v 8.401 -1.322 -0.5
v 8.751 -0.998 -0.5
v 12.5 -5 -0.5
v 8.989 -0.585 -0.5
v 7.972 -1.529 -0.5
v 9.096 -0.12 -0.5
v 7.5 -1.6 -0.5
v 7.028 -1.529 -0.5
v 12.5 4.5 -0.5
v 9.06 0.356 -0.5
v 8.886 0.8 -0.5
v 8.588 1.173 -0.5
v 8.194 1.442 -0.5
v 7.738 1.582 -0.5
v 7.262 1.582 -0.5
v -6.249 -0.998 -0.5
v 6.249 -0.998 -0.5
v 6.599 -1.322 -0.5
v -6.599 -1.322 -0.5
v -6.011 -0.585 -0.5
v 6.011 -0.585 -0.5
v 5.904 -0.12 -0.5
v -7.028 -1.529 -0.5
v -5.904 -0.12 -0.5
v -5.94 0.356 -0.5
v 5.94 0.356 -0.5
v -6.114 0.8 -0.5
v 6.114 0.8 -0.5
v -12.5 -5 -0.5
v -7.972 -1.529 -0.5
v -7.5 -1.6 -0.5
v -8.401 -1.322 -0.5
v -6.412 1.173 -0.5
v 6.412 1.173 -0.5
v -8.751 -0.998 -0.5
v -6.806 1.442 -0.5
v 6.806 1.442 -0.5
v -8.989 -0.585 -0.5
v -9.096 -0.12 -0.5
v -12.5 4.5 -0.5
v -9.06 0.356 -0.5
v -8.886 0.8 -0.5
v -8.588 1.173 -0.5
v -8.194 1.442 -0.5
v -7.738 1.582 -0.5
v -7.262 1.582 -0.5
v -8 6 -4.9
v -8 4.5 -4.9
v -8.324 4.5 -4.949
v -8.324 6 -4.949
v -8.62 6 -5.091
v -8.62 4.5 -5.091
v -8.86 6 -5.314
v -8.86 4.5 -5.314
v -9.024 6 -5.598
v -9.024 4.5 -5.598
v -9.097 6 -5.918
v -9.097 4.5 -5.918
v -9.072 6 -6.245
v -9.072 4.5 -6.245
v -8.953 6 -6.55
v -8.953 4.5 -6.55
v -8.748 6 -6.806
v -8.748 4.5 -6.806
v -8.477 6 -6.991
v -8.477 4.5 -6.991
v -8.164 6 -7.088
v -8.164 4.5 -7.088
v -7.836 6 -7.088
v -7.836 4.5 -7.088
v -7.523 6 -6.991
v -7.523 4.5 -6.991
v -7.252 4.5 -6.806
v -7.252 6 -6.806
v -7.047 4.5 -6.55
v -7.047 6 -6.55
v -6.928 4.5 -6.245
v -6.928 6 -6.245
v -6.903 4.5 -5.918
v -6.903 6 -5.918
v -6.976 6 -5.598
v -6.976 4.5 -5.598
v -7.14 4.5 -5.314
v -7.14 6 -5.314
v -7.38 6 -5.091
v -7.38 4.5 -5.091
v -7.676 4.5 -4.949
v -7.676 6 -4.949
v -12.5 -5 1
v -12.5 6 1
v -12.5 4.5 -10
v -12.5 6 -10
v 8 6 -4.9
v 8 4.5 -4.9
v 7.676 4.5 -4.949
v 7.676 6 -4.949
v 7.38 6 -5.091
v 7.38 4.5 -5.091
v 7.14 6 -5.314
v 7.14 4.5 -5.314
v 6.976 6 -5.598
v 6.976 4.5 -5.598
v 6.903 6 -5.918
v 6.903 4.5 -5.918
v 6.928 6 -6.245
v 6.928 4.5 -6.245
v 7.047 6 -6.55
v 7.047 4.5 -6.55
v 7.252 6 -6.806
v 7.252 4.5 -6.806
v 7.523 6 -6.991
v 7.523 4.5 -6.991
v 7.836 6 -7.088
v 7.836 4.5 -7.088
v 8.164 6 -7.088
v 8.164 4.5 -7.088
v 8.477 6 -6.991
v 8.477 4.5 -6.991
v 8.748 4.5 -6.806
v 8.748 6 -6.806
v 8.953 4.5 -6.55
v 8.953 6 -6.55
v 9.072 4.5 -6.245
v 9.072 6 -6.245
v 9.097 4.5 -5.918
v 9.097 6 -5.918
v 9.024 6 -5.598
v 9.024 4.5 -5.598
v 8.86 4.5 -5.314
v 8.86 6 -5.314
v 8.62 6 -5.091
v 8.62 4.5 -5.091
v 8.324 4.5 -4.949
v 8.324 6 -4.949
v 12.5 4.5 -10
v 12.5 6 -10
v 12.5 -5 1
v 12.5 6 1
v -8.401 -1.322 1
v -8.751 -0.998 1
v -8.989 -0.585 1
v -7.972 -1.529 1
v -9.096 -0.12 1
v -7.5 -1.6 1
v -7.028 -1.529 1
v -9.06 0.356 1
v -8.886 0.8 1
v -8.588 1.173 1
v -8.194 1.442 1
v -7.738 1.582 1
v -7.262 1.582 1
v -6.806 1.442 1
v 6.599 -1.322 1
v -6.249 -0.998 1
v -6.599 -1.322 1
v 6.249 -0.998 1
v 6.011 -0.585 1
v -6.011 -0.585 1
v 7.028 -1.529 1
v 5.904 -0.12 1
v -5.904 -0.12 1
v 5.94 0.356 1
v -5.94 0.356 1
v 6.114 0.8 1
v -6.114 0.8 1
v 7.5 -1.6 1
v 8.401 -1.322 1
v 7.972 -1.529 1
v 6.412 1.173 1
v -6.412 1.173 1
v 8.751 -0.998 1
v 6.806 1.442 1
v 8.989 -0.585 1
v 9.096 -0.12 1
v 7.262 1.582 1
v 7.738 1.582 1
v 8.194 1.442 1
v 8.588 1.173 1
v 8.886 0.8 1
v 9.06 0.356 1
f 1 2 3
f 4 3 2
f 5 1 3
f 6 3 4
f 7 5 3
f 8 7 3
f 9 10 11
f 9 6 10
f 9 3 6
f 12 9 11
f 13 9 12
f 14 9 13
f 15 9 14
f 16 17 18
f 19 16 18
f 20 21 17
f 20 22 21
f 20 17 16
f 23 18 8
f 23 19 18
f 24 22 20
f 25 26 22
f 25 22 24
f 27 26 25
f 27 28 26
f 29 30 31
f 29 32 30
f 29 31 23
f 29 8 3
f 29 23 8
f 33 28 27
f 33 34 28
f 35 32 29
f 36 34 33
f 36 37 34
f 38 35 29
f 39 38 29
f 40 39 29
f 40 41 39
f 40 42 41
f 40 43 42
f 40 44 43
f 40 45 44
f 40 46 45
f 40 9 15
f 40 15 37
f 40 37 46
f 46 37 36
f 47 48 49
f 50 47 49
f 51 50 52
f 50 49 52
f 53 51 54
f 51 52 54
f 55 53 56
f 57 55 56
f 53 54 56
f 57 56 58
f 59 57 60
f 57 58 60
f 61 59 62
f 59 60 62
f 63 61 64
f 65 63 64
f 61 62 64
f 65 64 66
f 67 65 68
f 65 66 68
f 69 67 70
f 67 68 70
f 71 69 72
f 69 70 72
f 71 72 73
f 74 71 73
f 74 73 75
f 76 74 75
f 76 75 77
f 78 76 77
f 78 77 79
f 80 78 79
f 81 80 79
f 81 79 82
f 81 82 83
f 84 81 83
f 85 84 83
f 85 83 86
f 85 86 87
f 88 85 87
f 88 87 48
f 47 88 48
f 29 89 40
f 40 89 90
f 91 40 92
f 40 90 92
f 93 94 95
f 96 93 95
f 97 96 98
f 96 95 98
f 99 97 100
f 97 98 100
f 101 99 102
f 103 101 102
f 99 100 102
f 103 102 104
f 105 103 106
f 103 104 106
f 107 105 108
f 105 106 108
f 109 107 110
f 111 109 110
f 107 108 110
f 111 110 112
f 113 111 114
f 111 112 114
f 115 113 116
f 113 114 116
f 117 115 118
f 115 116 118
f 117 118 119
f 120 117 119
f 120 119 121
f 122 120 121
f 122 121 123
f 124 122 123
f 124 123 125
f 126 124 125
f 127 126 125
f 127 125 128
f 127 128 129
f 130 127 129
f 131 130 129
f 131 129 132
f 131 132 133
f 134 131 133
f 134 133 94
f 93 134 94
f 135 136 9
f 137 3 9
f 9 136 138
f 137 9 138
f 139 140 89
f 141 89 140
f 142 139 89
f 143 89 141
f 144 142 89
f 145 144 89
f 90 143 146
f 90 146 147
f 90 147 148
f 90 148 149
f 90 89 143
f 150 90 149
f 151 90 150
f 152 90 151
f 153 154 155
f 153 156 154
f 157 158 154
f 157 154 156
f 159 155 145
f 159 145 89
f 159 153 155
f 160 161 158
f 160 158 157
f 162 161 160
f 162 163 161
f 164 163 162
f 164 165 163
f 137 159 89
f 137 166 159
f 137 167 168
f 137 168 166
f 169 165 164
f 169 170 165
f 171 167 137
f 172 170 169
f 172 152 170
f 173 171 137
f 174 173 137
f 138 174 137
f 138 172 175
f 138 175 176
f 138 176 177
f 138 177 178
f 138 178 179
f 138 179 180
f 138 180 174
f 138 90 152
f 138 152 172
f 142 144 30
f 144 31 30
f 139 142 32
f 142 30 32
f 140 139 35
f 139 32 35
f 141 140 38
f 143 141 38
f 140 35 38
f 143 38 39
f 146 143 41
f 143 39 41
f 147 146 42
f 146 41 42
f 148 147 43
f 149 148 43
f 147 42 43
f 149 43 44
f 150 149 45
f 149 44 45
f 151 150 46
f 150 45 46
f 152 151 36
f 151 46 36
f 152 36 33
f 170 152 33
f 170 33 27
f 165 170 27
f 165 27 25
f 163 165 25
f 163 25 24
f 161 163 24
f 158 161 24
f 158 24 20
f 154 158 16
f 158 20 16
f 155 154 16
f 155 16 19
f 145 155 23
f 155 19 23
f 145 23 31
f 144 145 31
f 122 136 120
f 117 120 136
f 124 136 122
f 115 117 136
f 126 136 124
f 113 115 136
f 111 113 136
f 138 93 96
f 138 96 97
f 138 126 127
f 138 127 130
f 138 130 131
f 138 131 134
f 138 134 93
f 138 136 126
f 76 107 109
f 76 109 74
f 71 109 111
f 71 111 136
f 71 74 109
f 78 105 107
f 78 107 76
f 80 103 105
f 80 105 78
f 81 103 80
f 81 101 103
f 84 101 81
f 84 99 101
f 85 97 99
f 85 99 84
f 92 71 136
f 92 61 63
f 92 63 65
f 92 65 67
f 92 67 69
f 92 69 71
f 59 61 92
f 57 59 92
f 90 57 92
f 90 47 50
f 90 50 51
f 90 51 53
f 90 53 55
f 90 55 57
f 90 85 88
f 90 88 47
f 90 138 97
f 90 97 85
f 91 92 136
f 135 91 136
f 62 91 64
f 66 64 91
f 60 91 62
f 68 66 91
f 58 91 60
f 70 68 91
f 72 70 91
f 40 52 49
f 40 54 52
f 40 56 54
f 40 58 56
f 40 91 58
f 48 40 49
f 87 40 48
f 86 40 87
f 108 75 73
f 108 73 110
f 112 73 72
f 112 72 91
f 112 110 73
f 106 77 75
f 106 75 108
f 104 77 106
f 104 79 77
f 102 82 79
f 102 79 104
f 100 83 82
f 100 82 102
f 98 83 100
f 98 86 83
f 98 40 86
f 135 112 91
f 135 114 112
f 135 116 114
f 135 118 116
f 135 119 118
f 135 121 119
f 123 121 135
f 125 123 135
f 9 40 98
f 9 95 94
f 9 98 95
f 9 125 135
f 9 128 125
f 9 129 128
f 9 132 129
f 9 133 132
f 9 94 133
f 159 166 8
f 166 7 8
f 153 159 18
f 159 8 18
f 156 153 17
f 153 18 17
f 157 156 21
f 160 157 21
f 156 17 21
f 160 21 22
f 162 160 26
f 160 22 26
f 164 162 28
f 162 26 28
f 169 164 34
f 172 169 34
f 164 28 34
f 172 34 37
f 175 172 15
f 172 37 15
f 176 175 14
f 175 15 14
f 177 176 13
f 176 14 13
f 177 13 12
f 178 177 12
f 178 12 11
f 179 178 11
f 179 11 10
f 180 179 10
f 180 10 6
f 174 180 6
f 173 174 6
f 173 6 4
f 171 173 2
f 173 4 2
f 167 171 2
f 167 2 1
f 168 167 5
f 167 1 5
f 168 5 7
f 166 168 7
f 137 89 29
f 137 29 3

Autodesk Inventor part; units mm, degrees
ref_plane "YZ Plane" through (0, 0, 0) normal (1, 0, 0) x (0, 1, 0)
ref_plane "XZ Plane" through (0, 0, 0) normal (0, 1, 0) x (-1, 0, 0)
ref_plane "XY Plane" through (0, 0, 0) normal (0, 0, 1) x (1, 0, 0)
sketch "スケッチ1" plane through (0, 0, 0) normal (0, 0, 1) x (1, 0, 0)
  line L0 (-12.5, 5) -> (12.5, 5)
  line L1 (12.5, 5) -> (12.5, -5)
  line L2 (12.5, -5) -> (-12.5, -5)
  line L3 (-12.5, -5) -> (-12.5, 5)
  line L4 (-12.5, 5) -> (12.5, -5) construction
  line L5 (12.5, 5) -> (-12.5, -5) construction
  point P0 (0, 0)
  dimension "d0" = 25
  dimension "d1" = 10
extrude "押し出し1" add sketch "スケッチ1" along normal blind 1
sketch "スケッチ3" plane through (0, 0, 1) normal (0, 0, 1) x (1, 0, 0)
  line L0 (-12.5, 5) -> (12.5, 5)
  line L1 (12.5, 5) -> (12.5, 6)
  line L2 (12.5, 6) -> (-12.5, 6)
  line L3 (-12.5, 6) -> (-12.5, 5)
  point P0 (0, 0)
  dimension "d15" = 25
  dimension "d16" = 1
extrude "押し出し2" add sketch "スケッチ3" against normal blind 11
sketch "スケッチ7" plane through (0, 0, 0) normal (0, 0, -1) x (-1, 0, 0)
  line L0 (12.5, -5) -> (-12.5, -5)
  line L1 (-12.5, -5) -> (-12.5, 5)
  line L2 (-12.5, 5) -> (12.5, 5)
  line L3 (12.5, 5) -> (12.5, -5)
  point P0 (0, 0)
extrude "押し出し4" add sketch "スケッチ7" along normal blind 0.5
sketch "スケッチ8" plane through (-12.5, 5, -10) normal (0, -1, 0) x (1, 0, 0)
  line L0 (0, 0) -> (25, 0)
  line L1 (25, 0) -> (25, 9.5)
  line L2 (25, 9.5) -> (0, 9.5)
  line L3 (0, 9.5) -> (0, 0)
  point P0 (12.5, 10)
extrude "押し出し5" add sketch "スケッチ8" along normal blind 0.5
sketch "スケッチ9" plane through (0, 0, 1) normal (0, 0, 1) x (1, 0, 0)
  line L0 (-12.5, 4.5) -> (12.5, 4.5) projected
  line L1 (12.5, -5) -> (12.5, 6) projected
  line L2 (-12.5, 6) -> (-12.5, -5) projected
  point P0 (0, 0)
  point P1 (7.5, 0)
  point P2 (-7.5, 0)
  dimension "d38" = 4.5
  dimension "d39" = 5
  dimension "d40" = 5
  dimension "d41" = 4.5
hole "穴3" at (7.5, 0, 1) at (-7.5, 0, 1) direction (0, 0, -1) diameter 3.2 depth 8 tip angle 118
sketch "スケッチ10" plane through (-12.5, 6, 1) normal (0, 1, 0) x (1, 0, 0)
  line L0 (0, 11) -> (25, 11) projected
  line L1 (25, 0) -> (25, 11) projected
  point P0 (12.5, 1)
  point P1 (4.5, 7)
  point P2 (20.5, 7)
  dimension "d49" = 4
  dimension "d50" = 4.5
  dimension "d51" = 4
  dimension "d52" = 16
hole "穴4" at (-8, 6, -6) at (8, 6, -6) direction (0, -1, 0) diameter 2.2 depth 8 tip angle 118
properties part number "Servo catch" material "アルミニウム 1100-H14"
